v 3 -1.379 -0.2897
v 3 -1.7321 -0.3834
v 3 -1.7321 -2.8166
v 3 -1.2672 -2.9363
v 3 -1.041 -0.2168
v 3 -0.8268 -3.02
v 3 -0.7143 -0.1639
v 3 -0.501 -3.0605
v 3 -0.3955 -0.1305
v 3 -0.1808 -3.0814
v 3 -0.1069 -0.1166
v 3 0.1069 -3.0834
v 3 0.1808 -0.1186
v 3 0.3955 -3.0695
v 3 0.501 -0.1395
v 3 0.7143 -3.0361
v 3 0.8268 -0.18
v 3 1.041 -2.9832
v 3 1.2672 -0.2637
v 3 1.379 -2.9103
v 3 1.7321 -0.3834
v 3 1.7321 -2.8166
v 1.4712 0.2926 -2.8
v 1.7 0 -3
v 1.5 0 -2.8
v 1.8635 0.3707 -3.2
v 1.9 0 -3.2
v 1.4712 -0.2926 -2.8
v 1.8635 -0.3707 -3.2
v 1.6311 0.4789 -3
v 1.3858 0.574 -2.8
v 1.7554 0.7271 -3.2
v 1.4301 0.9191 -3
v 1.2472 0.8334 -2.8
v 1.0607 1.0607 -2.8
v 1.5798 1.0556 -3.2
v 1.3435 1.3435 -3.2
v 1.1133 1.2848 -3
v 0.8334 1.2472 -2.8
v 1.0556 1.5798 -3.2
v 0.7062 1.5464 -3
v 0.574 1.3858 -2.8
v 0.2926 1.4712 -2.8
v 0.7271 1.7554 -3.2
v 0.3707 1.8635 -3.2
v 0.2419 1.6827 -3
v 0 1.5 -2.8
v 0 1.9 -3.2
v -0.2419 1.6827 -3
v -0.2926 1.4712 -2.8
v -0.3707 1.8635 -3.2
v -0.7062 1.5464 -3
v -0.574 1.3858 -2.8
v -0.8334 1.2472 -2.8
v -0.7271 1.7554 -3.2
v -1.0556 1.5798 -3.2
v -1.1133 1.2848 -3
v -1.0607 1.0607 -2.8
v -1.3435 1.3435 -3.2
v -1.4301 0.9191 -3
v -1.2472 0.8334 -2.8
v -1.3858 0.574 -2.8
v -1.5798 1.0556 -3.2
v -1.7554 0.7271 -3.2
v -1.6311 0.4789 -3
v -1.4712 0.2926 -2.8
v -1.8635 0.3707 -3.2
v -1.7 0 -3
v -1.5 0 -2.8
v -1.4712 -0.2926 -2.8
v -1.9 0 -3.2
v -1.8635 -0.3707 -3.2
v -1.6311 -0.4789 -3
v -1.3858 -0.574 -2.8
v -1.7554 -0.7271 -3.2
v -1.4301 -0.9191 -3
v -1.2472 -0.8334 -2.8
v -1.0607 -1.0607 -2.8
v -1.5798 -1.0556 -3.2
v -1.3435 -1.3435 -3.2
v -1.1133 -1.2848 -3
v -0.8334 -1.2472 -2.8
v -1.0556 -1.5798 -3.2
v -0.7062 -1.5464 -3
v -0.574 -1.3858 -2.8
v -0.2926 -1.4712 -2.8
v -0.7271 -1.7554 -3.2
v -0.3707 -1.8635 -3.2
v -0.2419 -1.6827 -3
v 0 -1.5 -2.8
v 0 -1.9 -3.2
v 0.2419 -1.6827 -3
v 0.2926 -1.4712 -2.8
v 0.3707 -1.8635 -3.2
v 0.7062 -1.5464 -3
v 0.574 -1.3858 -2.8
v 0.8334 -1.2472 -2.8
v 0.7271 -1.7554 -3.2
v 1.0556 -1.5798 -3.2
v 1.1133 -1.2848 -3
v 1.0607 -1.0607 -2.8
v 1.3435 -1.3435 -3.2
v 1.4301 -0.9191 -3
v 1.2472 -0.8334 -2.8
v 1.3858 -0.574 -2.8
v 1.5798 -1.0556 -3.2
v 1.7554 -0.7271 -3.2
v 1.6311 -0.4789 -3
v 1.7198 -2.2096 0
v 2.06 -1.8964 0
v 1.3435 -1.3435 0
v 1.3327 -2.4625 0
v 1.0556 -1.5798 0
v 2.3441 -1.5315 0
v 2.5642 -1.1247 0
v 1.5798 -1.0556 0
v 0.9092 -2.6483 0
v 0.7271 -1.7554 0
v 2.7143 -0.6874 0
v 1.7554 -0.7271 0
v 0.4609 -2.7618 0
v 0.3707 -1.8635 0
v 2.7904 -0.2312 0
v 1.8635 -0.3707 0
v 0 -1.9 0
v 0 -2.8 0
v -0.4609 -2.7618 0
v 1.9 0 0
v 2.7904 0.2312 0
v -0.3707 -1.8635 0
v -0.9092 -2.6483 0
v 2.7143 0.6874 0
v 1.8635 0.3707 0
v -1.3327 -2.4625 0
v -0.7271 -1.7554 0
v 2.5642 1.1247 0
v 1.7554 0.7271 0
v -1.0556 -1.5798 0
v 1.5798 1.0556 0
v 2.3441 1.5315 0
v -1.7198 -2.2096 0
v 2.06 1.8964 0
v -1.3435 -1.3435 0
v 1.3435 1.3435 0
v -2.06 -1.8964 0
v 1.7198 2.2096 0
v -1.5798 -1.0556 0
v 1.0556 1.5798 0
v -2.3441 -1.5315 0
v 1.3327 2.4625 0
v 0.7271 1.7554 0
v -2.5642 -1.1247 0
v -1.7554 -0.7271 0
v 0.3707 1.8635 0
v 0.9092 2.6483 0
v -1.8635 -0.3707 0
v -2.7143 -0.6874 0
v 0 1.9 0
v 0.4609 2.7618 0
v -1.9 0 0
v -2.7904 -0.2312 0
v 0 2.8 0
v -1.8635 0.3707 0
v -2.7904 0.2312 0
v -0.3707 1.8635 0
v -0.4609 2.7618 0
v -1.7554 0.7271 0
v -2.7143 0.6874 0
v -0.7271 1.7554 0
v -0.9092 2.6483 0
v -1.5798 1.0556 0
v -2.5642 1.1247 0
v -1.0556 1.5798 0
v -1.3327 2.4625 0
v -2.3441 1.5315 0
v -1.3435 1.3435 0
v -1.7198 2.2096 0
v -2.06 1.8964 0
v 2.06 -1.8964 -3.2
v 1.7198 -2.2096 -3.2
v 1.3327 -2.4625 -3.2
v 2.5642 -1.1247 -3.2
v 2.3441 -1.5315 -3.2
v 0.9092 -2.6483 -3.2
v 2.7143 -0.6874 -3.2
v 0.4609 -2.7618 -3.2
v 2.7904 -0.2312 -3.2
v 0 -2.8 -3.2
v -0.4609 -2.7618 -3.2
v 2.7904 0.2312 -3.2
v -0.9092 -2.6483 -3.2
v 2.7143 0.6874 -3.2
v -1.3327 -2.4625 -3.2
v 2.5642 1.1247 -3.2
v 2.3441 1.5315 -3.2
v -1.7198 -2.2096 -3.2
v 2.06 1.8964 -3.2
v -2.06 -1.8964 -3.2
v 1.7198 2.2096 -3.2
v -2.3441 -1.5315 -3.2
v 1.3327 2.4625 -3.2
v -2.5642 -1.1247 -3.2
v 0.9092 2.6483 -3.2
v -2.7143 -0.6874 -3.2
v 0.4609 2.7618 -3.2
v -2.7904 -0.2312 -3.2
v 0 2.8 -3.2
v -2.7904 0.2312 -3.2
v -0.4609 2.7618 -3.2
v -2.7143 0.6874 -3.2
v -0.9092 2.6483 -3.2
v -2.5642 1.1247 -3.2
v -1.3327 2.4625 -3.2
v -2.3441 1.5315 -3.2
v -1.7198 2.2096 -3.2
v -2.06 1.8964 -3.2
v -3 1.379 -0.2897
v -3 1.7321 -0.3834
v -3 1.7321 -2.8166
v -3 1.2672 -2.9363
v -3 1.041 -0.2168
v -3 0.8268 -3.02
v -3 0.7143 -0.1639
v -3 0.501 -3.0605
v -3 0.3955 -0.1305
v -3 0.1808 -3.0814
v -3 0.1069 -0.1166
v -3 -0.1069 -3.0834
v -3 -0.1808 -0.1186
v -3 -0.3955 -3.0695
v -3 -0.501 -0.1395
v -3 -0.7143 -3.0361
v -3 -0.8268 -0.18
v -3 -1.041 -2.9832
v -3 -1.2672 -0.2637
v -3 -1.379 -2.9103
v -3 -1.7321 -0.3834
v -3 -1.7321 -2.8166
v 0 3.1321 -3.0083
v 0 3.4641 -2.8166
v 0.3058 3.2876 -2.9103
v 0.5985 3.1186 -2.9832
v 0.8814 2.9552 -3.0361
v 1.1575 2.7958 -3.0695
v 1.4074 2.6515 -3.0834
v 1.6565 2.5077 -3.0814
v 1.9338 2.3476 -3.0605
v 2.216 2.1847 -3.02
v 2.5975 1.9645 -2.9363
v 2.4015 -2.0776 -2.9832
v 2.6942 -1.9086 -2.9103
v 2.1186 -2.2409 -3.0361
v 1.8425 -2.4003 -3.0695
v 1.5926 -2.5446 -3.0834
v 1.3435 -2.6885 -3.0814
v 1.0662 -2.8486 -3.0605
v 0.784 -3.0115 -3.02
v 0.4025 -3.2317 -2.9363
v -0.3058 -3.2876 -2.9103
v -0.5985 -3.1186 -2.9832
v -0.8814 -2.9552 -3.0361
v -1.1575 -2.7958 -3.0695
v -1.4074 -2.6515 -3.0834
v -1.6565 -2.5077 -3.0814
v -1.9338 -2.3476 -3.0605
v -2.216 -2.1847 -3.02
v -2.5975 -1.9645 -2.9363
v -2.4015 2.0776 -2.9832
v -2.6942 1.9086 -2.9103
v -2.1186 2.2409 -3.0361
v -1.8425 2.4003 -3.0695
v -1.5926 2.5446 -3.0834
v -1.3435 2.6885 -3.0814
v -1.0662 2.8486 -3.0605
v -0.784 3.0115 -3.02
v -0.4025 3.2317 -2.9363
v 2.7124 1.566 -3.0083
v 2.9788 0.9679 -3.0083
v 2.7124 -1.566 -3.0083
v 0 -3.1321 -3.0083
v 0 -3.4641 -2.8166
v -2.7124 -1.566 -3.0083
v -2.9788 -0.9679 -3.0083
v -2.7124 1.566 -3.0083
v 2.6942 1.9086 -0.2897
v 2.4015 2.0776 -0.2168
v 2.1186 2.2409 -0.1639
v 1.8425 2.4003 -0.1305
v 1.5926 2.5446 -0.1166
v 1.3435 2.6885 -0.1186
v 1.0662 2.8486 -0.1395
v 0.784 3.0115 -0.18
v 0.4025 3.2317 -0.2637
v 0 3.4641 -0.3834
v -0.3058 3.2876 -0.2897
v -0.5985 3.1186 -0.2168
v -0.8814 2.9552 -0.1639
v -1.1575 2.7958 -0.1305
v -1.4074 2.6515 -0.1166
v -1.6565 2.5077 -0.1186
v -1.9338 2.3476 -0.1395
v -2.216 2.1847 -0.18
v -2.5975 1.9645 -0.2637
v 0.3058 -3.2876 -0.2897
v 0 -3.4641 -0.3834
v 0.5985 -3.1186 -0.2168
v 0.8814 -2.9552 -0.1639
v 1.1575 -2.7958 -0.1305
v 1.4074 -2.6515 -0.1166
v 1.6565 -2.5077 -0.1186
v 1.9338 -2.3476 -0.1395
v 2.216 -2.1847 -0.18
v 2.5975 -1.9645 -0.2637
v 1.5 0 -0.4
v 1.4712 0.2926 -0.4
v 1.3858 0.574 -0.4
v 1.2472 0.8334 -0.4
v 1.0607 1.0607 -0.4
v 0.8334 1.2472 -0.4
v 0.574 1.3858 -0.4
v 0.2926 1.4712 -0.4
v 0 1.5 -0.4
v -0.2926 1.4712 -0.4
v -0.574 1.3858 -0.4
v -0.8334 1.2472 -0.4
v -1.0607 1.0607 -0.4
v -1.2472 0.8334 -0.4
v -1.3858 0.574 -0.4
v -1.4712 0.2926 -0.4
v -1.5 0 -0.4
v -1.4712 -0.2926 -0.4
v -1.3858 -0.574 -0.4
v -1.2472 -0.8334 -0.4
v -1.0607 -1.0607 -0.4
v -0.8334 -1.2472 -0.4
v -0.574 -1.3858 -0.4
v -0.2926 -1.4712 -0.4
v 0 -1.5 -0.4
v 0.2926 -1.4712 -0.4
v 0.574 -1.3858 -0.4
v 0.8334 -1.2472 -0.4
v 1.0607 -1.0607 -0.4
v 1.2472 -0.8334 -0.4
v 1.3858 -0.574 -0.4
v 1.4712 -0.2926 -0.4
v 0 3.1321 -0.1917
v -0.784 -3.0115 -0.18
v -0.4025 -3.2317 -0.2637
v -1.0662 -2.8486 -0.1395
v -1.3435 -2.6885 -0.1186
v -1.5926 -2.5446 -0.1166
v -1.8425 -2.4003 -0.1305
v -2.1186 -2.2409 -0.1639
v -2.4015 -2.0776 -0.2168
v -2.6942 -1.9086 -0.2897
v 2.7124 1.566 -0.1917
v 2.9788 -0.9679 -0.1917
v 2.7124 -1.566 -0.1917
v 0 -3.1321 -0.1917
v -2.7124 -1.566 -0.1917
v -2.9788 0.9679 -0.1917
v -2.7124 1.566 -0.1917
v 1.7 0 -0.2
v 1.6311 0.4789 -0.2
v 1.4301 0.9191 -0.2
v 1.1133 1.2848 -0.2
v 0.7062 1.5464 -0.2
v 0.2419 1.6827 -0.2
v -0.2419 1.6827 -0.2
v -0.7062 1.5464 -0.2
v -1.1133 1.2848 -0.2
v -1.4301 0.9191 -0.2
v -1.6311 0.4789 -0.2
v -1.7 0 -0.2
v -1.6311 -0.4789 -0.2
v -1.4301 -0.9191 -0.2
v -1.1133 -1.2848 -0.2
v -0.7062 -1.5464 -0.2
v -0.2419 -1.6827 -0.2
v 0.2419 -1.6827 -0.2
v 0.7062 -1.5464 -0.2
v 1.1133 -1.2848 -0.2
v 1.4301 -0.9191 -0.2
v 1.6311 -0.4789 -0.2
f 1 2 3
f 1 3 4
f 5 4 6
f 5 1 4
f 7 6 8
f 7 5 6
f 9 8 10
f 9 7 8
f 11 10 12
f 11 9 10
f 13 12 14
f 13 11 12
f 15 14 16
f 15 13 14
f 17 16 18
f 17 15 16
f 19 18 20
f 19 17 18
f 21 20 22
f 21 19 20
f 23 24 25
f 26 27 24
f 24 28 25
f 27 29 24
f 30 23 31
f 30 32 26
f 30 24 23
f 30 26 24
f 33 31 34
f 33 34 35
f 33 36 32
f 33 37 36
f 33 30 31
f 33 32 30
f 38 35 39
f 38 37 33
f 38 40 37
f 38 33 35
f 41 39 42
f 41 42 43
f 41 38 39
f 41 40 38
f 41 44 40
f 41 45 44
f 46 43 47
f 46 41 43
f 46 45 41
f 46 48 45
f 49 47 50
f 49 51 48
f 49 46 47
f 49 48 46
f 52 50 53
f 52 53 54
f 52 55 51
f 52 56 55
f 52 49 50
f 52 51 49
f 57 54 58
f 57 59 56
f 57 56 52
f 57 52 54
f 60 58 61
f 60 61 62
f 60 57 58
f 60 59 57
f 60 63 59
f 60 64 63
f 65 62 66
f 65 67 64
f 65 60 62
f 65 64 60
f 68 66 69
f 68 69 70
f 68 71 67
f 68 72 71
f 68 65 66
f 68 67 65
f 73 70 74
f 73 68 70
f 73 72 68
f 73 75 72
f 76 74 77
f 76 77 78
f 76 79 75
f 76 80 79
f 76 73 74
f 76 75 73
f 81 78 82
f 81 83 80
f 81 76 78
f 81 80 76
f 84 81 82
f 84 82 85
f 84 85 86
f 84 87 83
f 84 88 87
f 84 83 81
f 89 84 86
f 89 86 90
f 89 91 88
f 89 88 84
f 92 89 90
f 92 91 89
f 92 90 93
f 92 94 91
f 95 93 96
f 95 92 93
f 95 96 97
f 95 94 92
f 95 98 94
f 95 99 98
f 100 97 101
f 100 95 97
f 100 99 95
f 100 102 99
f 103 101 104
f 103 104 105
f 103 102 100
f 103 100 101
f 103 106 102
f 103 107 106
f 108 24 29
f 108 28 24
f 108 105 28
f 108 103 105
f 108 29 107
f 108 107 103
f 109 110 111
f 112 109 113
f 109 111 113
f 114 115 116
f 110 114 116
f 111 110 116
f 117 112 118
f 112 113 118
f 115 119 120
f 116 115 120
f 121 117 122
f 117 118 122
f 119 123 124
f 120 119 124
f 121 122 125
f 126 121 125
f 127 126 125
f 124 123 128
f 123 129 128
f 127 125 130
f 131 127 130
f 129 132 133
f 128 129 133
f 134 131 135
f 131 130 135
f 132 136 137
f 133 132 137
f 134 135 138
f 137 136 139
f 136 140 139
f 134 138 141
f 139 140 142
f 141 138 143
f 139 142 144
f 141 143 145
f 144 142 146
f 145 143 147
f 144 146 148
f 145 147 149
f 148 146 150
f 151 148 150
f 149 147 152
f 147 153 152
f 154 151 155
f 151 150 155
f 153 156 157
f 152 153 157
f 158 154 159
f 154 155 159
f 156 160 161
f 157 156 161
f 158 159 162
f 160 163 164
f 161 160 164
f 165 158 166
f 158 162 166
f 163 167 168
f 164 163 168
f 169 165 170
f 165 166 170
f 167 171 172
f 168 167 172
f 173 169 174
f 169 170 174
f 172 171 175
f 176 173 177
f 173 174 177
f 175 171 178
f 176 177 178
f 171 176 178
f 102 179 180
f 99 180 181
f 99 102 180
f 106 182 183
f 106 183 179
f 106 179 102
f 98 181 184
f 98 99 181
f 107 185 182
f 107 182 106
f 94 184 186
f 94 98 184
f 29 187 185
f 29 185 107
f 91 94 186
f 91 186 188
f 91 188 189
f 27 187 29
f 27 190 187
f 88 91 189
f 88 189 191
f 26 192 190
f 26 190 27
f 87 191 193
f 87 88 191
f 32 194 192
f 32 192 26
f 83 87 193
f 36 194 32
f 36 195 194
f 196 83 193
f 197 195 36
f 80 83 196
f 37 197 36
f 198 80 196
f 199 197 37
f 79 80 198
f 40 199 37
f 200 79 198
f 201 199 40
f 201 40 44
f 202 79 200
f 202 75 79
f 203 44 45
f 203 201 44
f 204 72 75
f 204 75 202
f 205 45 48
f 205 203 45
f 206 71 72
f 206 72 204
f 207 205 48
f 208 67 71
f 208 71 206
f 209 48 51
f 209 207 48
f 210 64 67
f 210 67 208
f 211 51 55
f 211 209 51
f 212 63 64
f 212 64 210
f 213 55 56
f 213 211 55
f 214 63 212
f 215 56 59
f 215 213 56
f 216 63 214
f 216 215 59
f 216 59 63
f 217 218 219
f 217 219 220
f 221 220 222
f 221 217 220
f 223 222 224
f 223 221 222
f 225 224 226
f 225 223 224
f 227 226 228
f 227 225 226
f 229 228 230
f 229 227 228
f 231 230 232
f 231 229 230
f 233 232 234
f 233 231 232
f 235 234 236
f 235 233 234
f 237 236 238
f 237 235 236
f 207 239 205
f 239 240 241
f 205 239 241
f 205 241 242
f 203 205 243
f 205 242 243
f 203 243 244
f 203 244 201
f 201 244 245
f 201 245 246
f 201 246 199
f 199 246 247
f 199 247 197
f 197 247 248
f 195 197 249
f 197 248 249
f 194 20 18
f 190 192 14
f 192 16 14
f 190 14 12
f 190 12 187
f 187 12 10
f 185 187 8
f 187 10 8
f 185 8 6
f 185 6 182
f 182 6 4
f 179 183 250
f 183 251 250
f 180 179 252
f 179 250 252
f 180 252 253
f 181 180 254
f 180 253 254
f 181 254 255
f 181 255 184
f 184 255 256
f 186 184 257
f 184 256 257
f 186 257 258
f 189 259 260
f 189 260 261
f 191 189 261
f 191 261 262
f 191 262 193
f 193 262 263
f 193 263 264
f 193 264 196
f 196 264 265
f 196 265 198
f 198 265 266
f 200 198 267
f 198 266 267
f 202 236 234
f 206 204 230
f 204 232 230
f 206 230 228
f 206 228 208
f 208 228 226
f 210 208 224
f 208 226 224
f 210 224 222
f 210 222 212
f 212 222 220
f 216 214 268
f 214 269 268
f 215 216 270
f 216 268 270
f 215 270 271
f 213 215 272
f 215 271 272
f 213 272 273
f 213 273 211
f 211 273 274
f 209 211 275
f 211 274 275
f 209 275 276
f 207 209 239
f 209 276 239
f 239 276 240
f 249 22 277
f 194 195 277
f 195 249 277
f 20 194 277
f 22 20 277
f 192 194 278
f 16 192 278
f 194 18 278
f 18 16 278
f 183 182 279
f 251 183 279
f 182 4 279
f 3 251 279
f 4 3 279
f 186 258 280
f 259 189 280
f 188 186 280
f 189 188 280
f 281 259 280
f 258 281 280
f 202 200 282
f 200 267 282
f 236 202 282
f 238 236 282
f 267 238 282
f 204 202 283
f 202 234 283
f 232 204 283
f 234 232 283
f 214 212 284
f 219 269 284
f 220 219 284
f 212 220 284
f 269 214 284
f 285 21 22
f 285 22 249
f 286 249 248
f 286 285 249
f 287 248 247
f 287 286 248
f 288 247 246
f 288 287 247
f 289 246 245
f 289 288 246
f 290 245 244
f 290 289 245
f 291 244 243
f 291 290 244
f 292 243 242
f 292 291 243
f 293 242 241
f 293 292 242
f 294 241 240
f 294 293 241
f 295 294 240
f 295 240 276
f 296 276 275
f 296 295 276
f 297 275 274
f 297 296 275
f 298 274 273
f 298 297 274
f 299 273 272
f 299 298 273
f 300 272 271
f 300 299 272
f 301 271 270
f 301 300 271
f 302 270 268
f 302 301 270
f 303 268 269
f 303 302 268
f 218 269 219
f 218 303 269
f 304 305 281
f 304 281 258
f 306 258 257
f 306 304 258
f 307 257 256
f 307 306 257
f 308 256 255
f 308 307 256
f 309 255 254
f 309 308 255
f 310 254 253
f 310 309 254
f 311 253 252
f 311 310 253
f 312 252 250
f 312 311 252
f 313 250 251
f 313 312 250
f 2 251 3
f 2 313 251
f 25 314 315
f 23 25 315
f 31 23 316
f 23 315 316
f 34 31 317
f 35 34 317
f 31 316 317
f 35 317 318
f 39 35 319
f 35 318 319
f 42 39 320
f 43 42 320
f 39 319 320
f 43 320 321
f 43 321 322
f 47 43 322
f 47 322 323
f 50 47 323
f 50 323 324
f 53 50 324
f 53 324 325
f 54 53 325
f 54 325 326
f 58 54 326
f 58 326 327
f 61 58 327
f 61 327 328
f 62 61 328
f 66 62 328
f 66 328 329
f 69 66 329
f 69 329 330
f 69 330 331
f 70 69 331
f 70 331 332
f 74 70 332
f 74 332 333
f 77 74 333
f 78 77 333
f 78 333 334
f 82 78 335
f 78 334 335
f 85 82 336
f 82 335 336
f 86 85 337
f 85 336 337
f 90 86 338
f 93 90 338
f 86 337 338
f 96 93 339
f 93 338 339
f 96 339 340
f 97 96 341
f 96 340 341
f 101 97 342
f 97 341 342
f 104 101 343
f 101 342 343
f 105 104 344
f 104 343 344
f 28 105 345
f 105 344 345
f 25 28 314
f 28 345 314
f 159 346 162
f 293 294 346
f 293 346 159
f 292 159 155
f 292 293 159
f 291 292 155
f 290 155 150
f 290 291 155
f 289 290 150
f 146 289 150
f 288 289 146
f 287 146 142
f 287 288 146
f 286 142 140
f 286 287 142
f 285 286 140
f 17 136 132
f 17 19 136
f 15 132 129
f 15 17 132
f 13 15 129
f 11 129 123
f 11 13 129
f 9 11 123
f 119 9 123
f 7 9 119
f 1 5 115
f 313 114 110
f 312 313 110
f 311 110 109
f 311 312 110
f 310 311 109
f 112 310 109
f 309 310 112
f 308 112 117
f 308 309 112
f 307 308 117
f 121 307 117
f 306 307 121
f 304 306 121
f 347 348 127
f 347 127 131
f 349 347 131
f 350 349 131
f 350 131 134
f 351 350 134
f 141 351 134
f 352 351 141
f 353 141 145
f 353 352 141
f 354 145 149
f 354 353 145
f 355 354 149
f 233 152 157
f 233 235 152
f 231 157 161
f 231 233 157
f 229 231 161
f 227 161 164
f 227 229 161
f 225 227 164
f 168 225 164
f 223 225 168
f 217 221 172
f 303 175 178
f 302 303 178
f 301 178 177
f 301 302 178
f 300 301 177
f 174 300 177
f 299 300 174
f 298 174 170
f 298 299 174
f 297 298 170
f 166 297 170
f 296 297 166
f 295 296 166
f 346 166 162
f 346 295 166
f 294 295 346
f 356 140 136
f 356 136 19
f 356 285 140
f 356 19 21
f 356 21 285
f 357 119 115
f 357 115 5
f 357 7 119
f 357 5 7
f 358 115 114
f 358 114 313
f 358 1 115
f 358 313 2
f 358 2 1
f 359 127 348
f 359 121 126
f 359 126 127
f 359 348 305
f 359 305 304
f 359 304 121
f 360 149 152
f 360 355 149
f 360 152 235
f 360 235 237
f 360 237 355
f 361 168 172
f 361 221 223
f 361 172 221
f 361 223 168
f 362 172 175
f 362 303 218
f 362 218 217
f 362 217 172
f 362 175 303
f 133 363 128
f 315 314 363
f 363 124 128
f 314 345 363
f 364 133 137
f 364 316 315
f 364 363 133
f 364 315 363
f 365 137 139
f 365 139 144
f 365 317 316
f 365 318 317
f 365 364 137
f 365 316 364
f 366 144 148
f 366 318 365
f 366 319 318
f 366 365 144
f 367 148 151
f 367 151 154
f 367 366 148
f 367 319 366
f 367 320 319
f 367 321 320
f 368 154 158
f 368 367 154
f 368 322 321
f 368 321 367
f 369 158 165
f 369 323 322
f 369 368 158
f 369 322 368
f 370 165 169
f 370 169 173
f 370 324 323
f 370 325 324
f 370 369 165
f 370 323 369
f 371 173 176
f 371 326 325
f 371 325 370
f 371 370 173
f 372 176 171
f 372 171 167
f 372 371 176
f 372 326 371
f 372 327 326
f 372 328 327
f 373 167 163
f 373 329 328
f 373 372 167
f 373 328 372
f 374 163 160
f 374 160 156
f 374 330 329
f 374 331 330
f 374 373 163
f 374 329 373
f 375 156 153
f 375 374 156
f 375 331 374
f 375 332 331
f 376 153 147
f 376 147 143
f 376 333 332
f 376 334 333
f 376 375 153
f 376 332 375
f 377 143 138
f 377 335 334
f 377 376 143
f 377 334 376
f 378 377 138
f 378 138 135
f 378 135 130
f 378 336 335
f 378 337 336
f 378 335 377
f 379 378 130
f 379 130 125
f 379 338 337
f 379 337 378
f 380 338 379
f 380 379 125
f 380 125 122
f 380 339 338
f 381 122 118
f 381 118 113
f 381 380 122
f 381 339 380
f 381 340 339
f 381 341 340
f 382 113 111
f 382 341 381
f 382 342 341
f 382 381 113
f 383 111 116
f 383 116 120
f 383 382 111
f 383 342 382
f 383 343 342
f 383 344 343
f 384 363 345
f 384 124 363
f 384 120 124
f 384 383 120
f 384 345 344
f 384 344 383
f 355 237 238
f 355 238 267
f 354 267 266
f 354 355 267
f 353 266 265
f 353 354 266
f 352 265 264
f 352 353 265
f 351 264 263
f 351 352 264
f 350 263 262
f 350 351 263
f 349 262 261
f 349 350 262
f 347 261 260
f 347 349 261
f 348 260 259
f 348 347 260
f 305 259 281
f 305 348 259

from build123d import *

# Parameters (mm, degrees)
SKETCH_1_W               = 5
SKETCH_1_H               = 3.2
SKETCH_2_OUTSIDE_W       = 14.9
SKETCH_2_OUTSIDE_H       = 14.9
CUT_EXTRUDE_1_DEPTH      = 3.2
SKETCH_3_R               = 1.5
CUT_EXTRUDE_2_DEPTH      = 1
CUT_EXTRUDE_2_DEPTH_BACK = 4.2
CHAMFER_1_SIZE           = 0.4


with BuildPart() as part:
    # Эскиз1 → Повернуть1 (revolve)
    with BuildSketch(Plane(origin=(0, 0, 0), x_dir=(1, 0, 0), z_dir=(0, 1, 0))):
        with Locations((-2.5, 1.6)):
            Rectangle(SKETCH_1_W, SKETCH_1_H)
    revolve(axis=Axis((0, 0, 0), (0, 0, -1)))

    # Эскиз2 outside → Вырез-Вытянуть1 (cut)
    with BuildSketch(Plane.XY):
        Rectangle(SKETCH_2_OUTSIDE_W, SKETCH_2_OUTSIDE_H)
        Polygon((3, -1.732050808), (3, 1.732050808), (0, 3.464101615), (-3, 1.732050808), (-3, -1.732050808), (0, -3.464101615), align=None, mode=Mode.SUBTRACT)
    extrude(amount=-CUT_EXTRUDE_1_DEPTH, mode=Mode.SUBTRACT)

    # Эскиз3 → Вырез-Вытянуть2 (cut, two sides)
    with BuildSketch(Plane.XY) as cut_extrude_2_sk:
        Circle(SKETCH_3_R)
    extrude(amount=CUT_EXTRUDE_2_DEPTH, mode=Mode.SUBTRACT)
    extrude(cut_extrude_2_sk.sketch, amount=-CUT_EXTRUDE_2_DEPTH_BACK, mode=Mode.SUBTRACT)

    # Эскиз4 → Вырез-Повернуть1 (revolve, cut)
    with BuildSketch(Plane(origin=(0, 0, 0), x_dir=(0, 0, -1), z_dir=(1, 0, 0))):
        Polygon((0, 2.8), (0.383419246, 3.464101615), (0, 3.464101615), align=None)
        Polygon((3.2, 2.8), (2.816580754, 3.464101615), (3.2, 3.464101615), align=None)
    revolve(axis=Axis((0, 0, 0), (0, 0, -1)), mode=Mode.SUBTRACT)

    # Фаска1
    chamfer_1_edges = [part.edges().sort_by_distance(p)[0] for p in [
        (-1.5, 0, -3.2),
        (-1.5, 0, 0),
    ]]
    chamfer(chamfer_1_edges, length=CHAMFER_1_SIZE)


solid = part.part
